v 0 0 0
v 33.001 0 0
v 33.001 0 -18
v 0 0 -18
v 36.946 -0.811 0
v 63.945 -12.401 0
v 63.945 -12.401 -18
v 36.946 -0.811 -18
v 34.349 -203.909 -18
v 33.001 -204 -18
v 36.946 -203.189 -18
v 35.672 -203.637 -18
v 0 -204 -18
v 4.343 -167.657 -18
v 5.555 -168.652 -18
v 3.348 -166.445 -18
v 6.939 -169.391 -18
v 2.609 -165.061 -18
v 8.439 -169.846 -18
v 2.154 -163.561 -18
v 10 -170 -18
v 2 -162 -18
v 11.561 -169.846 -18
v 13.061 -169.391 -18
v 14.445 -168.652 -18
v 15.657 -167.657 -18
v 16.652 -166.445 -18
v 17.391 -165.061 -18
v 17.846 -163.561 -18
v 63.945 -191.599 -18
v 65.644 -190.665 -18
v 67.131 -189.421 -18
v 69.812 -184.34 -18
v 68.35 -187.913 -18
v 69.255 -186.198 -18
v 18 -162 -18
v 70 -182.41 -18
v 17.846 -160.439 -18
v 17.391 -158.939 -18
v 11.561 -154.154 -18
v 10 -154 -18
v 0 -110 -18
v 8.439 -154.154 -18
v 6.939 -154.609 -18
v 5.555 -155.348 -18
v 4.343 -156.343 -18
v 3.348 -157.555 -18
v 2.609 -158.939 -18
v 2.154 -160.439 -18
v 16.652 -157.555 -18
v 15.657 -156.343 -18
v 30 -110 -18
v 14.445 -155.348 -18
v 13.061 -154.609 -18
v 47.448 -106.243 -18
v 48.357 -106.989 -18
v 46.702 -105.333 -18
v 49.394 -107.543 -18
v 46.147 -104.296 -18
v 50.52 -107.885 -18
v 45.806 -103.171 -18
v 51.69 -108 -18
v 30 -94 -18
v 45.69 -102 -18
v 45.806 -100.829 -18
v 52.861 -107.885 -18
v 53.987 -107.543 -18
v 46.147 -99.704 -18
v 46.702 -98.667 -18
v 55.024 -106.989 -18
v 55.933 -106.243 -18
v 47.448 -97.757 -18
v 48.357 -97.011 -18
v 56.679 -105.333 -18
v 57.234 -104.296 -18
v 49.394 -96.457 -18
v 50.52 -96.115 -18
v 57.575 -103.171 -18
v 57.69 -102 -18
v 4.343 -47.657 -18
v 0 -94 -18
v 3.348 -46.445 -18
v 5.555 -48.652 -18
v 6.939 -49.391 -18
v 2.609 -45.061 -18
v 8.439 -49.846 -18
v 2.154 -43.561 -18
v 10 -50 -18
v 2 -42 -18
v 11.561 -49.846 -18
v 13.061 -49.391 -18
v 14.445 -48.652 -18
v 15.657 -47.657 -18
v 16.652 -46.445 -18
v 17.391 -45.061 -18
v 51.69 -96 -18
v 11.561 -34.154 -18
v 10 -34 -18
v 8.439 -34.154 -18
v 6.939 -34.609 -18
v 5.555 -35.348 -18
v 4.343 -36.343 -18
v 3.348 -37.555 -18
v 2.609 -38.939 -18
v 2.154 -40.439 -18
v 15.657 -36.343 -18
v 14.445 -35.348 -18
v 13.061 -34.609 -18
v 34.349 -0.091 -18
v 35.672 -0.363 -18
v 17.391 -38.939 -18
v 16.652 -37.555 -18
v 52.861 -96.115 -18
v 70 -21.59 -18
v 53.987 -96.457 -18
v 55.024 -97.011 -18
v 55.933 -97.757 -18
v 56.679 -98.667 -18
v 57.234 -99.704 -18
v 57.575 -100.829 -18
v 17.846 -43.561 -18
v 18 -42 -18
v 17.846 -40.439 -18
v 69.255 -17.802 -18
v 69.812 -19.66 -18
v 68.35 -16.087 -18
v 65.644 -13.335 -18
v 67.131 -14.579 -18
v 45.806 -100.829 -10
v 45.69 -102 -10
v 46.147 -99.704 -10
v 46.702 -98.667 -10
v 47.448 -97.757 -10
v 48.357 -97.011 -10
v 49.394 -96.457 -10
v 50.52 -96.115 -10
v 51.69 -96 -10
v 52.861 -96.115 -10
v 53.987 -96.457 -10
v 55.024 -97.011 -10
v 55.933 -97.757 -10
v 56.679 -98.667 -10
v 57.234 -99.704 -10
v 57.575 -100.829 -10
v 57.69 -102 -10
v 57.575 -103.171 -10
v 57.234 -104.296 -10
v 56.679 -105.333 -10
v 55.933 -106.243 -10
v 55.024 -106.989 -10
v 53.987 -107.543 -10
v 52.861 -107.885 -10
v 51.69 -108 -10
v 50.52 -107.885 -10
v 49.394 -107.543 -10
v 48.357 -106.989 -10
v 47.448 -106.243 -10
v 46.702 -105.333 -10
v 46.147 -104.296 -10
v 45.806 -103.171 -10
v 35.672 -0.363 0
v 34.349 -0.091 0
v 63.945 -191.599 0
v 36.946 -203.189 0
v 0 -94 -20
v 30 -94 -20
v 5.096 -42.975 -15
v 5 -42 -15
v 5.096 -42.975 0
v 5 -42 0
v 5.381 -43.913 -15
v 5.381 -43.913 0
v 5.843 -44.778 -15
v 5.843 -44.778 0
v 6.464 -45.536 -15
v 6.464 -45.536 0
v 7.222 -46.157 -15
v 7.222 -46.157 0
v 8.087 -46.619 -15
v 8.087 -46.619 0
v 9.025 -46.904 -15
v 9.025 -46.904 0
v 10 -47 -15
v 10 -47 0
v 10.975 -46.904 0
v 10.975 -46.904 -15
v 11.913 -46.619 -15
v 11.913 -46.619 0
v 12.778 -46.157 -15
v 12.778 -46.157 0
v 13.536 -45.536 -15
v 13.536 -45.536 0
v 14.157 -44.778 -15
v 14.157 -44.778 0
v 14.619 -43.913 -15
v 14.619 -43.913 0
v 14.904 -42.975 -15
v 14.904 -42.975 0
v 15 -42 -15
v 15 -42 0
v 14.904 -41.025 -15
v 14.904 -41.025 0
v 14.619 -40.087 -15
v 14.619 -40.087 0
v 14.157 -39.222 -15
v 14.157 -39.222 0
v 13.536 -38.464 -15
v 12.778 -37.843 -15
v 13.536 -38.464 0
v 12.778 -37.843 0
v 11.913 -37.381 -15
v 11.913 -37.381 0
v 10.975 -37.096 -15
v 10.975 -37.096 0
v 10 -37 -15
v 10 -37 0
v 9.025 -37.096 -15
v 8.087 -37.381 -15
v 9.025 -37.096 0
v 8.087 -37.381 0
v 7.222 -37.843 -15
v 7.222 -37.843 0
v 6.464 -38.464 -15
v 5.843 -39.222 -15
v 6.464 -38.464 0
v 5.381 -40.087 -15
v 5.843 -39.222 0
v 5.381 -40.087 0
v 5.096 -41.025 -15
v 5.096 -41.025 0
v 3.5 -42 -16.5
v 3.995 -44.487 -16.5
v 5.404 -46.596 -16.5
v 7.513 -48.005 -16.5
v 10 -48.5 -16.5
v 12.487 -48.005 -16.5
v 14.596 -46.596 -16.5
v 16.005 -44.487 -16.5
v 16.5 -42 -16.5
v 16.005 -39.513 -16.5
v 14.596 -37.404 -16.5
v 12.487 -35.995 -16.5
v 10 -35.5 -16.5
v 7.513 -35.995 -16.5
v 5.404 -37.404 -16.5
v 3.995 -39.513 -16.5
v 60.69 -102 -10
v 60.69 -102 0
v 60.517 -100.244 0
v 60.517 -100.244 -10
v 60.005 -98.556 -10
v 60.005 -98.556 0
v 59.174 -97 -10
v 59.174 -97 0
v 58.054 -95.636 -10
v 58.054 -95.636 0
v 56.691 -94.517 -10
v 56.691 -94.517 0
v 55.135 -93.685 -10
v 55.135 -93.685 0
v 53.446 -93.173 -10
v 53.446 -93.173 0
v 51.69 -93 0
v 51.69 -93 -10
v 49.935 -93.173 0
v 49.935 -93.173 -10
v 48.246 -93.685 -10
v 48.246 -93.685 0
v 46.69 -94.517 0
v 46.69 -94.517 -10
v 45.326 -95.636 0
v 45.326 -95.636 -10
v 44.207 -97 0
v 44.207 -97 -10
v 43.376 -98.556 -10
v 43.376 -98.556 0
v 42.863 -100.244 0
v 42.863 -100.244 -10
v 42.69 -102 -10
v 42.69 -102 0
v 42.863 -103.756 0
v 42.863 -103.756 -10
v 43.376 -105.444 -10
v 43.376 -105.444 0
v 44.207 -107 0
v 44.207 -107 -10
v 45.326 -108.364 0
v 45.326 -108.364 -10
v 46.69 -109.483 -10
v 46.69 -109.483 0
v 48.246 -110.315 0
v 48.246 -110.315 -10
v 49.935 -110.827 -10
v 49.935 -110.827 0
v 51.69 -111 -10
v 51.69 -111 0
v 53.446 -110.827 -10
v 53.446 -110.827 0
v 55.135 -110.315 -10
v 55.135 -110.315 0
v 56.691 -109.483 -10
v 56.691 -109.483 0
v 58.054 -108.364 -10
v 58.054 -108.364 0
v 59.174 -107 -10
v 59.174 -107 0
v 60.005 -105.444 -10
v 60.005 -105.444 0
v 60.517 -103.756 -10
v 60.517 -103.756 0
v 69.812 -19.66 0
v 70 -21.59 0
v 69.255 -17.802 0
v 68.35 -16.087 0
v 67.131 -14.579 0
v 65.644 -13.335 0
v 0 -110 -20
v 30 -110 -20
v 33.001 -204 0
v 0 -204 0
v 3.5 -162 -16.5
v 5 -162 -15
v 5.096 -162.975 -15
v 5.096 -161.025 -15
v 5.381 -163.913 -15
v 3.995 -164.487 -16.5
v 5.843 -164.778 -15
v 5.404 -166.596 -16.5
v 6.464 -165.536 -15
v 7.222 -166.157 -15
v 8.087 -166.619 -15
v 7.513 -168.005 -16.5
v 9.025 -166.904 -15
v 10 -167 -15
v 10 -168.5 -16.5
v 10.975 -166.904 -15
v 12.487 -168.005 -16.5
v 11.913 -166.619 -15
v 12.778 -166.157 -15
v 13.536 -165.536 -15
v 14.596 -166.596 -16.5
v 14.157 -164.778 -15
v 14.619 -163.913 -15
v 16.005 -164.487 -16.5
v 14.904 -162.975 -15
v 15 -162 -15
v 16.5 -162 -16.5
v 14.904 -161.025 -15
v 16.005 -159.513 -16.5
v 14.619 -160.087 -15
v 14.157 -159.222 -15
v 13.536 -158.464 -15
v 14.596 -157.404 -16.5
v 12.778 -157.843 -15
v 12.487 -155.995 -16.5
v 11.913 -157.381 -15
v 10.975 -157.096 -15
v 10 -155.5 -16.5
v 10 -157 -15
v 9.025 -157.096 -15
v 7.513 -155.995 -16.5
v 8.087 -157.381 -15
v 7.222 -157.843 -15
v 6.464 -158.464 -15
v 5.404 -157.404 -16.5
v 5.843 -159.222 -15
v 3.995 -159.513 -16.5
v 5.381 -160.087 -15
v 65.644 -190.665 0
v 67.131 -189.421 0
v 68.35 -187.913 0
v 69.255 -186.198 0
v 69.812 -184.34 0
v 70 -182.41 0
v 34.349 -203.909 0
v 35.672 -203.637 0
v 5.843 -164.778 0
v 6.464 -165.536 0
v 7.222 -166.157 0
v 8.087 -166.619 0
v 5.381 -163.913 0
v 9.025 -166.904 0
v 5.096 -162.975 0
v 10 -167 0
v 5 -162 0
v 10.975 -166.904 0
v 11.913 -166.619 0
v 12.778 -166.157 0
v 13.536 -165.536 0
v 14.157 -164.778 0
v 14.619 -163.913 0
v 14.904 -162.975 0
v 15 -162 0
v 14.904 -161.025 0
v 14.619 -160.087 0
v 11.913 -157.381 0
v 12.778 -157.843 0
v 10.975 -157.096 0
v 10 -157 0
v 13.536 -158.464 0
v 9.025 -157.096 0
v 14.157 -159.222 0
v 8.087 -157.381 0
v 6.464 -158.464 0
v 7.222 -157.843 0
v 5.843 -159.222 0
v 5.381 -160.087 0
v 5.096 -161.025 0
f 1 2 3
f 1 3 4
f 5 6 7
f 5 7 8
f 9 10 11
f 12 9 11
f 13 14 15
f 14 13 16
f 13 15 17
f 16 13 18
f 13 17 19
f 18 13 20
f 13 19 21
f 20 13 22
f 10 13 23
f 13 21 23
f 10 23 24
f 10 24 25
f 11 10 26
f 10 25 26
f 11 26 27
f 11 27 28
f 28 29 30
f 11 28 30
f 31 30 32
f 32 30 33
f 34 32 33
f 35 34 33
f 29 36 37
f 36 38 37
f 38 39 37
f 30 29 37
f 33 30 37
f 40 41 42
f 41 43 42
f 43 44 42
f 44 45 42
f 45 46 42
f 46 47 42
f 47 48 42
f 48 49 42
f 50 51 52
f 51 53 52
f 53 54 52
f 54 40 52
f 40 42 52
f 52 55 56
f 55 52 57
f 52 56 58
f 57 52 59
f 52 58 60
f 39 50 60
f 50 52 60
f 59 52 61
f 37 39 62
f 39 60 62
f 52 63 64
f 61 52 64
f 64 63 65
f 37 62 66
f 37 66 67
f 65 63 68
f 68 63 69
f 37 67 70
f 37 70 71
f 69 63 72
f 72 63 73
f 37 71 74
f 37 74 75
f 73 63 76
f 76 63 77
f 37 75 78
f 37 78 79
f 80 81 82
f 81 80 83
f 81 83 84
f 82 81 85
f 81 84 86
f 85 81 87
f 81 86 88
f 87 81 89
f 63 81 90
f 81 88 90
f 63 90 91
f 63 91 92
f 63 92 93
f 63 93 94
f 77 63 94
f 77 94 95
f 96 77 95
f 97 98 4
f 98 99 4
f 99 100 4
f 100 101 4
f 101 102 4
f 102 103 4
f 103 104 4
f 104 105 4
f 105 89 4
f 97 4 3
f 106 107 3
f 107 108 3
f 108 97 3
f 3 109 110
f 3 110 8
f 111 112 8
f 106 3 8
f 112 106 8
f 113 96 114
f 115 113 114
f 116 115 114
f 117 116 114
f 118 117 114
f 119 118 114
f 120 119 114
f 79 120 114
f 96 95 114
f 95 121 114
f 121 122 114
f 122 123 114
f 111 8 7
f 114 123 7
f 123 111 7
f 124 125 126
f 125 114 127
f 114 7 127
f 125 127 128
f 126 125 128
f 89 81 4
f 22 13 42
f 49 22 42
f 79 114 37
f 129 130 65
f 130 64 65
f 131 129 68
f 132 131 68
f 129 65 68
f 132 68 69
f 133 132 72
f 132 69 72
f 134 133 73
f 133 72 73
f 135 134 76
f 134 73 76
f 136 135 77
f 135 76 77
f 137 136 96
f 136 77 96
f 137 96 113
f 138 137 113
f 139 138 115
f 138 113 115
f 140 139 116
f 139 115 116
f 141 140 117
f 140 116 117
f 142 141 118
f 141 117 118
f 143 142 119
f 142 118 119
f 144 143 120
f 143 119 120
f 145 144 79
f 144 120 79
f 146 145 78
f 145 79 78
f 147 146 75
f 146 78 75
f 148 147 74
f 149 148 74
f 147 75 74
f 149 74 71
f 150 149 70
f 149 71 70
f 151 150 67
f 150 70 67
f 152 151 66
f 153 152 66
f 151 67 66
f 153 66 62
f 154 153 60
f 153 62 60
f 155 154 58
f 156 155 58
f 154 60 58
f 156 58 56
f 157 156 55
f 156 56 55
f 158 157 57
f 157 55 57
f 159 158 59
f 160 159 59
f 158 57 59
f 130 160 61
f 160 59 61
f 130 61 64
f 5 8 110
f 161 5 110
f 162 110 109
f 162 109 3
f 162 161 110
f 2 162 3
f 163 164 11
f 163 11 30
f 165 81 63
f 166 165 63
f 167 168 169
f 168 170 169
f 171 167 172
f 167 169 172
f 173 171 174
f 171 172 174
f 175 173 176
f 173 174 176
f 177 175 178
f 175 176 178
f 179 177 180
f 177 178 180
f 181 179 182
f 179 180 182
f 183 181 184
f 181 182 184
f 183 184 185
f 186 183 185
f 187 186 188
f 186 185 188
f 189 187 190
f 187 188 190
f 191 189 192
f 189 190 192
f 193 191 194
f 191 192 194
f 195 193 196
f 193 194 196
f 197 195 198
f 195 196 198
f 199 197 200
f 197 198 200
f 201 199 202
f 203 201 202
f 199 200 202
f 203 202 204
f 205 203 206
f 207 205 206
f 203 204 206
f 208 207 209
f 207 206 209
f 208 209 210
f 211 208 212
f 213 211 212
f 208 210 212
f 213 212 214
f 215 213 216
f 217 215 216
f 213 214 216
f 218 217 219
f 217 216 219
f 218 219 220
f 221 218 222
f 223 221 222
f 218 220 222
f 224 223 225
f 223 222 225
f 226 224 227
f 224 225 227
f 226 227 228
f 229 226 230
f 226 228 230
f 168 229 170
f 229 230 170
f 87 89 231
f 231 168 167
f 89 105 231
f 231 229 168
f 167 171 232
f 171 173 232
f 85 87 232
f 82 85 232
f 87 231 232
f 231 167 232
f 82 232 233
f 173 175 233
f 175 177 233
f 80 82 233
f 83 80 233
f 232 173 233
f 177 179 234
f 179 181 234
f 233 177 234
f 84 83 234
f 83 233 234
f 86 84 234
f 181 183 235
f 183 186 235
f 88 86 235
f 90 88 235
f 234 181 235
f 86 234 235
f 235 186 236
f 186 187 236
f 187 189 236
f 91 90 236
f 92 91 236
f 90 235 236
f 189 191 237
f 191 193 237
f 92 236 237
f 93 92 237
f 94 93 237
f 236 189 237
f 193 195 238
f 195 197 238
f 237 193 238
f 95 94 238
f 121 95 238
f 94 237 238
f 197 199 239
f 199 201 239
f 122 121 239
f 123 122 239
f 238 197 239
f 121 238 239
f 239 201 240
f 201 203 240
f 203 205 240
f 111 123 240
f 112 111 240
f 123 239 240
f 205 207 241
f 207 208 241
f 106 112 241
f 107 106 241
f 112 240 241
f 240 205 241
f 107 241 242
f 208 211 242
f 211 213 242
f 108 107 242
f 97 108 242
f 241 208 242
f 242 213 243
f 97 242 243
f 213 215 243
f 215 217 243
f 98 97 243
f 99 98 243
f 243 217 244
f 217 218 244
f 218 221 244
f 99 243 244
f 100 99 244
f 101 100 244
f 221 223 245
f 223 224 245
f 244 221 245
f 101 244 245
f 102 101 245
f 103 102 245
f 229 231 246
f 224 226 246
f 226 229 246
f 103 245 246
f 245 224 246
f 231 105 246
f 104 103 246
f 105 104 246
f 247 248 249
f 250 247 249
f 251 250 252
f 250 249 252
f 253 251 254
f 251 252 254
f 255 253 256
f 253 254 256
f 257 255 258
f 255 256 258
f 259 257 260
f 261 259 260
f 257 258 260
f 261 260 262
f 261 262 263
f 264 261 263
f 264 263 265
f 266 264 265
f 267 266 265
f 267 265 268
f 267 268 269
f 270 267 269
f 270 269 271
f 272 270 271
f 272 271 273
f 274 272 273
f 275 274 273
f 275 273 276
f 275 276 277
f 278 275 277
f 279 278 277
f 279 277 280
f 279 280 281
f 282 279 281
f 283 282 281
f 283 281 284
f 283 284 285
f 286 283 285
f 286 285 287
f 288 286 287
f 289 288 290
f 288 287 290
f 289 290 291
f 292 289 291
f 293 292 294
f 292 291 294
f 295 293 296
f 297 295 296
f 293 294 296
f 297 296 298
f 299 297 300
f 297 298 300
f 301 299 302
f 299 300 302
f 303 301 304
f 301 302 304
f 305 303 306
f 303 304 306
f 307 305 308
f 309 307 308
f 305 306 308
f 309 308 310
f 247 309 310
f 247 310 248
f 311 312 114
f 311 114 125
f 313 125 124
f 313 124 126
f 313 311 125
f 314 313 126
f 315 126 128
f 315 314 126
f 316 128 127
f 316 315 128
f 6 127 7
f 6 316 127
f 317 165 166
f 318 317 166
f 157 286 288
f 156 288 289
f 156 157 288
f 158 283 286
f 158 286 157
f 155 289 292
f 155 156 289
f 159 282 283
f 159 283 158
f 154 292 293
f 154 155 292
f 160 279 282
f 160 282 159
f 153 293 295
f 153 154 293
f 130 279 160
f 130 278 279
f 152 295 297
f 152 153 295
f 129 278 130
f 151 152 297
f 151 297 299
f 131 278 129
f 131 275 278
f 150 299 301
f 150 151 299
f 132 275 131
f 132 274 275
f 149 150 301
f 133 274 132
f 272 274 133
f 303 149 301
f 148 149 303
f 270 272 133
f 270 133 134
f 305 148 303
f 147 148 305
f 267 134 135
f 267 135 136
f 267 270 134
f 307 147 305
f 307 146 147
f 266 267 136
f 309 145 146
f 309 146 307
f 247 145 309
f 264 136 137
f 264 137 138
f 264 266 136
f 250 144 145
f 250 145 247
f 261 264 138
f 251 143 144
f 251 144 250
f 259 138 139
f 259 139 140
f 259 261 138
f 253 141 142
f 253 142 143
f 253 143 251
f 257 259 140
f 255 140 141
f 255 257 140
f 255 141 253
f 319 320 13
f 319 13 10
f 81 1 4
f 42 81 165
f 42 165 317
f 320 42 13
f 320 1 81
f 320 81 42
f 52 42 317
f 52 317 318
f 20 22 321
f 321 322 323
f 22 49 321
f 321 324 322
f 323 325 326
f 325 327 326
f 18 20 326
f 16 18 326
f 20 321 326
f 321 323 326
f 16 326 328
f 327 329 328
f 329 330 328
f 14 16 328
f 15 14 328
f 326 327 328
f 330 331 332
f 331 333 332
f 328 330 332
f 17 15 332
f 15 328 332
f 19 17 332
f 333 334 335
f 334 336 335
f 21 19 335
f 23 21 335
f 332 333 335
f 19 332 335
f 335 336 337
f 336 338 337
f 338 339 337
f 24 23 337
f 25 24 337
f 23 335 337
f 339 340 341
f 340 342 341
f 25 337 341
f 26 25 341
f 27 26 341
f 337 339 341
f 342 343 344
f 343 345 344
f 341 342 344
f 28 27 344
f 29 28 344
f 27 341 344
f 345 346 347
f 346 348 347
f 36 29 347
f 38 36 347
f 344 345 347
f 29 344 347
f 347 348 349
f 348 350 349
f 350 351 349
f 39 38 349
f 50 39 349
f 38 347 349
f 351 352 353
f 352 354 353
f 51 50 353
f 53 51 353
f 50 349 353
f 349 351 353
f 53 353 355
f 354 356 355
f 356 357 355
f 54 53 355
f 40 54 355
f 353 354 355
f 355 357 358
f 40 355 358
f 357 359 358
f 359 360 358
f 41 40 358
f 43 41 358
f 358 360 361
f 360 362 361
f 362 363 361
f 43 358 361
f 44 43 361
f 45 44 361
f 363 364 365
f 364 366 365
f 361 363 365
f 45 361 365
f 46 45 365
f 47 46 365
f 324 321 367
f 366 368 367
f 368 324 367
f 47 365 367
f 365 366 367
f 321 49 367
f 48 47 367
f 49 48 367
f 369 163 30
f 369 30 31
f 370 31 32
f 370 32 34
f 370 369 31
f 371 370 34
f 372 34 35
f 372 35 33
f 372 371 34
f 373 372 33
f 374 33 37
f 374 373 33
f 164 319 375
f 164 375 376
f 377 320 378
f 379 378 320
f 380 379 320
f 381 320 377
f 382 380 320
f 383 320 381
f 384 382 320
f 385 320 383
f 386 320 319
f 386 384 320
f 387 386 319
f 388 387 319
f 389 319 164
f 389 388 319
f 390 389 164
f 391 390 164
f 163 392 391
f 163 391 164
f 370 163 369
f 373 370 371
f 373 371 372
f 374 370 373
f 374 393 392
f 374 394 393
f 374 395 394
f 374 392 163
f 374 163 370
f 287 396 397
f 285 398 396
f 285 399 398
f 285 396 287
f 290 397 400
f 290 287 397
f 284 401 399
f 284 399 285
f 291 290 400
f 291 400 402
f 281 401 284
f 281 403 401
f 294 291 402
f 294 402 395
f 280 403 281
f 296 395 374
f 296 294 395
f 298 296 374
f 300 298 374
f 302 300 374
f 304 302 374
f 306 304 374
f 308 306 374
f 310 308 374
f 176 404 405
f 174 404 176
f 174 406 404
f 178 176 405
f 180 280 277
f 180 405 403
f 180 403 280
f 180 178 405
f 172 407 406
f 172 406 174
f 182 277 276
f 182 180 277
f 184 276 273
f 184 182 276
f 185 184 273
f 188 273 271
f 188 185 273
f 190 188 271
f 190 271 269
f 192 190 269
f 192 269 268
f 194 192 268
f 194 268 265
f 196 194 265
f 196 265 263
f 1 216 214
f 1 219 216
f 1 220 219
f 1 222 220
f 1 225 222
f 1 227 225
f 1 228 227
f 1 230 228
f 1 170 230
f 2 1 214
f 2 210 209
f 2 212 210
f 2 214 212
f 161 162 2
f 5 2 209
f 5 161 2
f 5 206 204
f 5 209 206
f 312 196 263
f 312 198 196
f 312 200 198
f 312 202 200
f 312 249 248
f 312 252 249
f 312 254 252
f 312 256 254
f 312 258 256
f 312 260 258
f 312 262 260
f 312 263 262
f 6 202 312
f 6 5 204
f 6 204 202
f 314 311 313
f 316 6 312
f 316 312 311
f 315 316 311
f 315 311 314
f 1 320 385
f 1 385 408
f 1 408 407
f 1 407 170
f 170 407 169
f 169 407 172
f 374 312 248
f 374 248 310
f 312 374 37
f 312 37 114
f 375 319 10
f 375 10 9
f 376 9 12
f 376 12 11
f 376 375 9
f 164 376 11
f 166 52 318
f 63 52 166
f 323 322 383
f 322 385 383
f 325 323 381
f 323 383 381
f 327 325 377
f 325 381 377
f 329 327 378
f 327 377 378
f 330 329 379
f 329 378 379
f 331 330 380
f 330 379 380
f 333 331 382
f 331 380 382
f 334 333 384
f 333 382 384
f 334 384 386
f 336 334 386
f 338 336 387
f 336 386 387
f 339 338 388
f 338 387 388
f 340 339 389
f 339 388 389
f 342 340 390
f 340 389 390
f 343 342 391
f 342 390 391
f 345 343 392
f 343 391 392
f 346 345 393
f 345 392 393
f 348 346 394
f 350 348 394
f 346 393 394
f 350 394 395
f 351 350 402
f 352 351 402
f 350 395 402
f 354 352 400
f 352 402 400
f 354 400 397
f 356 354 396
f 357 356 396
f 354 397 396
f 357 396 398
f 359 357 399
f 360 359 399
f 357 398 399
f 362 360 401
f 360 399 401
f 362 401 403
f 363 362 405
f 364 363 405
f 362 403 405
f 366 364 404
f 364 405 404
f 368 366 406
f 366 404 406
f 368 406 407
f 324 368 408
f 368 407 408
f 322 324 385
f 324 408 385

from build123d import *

# Parameters (mm, degrees)
F0_W           = 30
F0_H           = 16
F1_DEPTH       = 18
F2_D           = 12
F2_CBORE_D     = 18
F2_CBORE_DEPTH = 10
F3_DEPTH       = 20
F4_D           = 10
F4_CSINK_D     = 16
F4_CSINK_ANGLE = 90


with BuildPart() as f1:
    # F0 (on Top) → F1 (new body)
    with BuildSketch(Plane.XY):
        with BuildLine():
            Line((33.001347, 0), (0, 0))
            Line((0, 0), (0, -94))
            Line((0, -94), (30, -94))
            Line((30, -94), (30, -110))
            Line((30, -110), (0, -110))
            Line((0, -110), (0, -204))
            Line((0, -204), (33.001347, -204))
            ThreePointArc((33.001347, -204), (35.014898, -203.795183), (36.945967, -203.189123))
            Line((36.945967, -203.189123), (63.94462, -191.599396))
            ThreePointArc((63.94462, -191.599396), (68.350036, -187.912719), (70, -182.410274))
            Line((70, -182.410274), (70, -21.589726))
            ThreePointArc((70, -21.589726), (68.350036, -16.087281), (63.94462, -12.400604))
            Line((63.94462, -12.400604), (36.945967, -0.810877))
            ThreePointArc((36.945967, -0.810877), (35.014898, -0.204817), (33.001347, 0))
        make_face()
        with Locations((15, -102)):
            Rectangle(F0_W, F0_H)
    extrude(amount=-F1_DEPTH)

    # F2 (through all)
    with Locations(Plane.XY):
        with Locations((51.690422, -102)):
            CounterBoreHole(F2_D / 2, F2_CBORE_D / 2, F2_CBORE_DEPTH)

    # F0 (on Top) → F3 (join)
    with BuildSketch(Plane.XY):
        with Locations((15, -102)):
            Rectangle(F0_W, F0_H)
    extrude(amount=-F3_DEPTH)

    # F4 (through all)
    with Locations(Plane(origin=(0, 0, -18), x_dir=(1, 0, 0), z_dir=(0, 0, -1))):
        with Locations((10, 162), (10, 42)):
            CounterSinkHole(F4_D / 2, F4_CSINK_D / 2, counter_sink_angle=F4_CSINK_ANGLE)


solid = f1.part
